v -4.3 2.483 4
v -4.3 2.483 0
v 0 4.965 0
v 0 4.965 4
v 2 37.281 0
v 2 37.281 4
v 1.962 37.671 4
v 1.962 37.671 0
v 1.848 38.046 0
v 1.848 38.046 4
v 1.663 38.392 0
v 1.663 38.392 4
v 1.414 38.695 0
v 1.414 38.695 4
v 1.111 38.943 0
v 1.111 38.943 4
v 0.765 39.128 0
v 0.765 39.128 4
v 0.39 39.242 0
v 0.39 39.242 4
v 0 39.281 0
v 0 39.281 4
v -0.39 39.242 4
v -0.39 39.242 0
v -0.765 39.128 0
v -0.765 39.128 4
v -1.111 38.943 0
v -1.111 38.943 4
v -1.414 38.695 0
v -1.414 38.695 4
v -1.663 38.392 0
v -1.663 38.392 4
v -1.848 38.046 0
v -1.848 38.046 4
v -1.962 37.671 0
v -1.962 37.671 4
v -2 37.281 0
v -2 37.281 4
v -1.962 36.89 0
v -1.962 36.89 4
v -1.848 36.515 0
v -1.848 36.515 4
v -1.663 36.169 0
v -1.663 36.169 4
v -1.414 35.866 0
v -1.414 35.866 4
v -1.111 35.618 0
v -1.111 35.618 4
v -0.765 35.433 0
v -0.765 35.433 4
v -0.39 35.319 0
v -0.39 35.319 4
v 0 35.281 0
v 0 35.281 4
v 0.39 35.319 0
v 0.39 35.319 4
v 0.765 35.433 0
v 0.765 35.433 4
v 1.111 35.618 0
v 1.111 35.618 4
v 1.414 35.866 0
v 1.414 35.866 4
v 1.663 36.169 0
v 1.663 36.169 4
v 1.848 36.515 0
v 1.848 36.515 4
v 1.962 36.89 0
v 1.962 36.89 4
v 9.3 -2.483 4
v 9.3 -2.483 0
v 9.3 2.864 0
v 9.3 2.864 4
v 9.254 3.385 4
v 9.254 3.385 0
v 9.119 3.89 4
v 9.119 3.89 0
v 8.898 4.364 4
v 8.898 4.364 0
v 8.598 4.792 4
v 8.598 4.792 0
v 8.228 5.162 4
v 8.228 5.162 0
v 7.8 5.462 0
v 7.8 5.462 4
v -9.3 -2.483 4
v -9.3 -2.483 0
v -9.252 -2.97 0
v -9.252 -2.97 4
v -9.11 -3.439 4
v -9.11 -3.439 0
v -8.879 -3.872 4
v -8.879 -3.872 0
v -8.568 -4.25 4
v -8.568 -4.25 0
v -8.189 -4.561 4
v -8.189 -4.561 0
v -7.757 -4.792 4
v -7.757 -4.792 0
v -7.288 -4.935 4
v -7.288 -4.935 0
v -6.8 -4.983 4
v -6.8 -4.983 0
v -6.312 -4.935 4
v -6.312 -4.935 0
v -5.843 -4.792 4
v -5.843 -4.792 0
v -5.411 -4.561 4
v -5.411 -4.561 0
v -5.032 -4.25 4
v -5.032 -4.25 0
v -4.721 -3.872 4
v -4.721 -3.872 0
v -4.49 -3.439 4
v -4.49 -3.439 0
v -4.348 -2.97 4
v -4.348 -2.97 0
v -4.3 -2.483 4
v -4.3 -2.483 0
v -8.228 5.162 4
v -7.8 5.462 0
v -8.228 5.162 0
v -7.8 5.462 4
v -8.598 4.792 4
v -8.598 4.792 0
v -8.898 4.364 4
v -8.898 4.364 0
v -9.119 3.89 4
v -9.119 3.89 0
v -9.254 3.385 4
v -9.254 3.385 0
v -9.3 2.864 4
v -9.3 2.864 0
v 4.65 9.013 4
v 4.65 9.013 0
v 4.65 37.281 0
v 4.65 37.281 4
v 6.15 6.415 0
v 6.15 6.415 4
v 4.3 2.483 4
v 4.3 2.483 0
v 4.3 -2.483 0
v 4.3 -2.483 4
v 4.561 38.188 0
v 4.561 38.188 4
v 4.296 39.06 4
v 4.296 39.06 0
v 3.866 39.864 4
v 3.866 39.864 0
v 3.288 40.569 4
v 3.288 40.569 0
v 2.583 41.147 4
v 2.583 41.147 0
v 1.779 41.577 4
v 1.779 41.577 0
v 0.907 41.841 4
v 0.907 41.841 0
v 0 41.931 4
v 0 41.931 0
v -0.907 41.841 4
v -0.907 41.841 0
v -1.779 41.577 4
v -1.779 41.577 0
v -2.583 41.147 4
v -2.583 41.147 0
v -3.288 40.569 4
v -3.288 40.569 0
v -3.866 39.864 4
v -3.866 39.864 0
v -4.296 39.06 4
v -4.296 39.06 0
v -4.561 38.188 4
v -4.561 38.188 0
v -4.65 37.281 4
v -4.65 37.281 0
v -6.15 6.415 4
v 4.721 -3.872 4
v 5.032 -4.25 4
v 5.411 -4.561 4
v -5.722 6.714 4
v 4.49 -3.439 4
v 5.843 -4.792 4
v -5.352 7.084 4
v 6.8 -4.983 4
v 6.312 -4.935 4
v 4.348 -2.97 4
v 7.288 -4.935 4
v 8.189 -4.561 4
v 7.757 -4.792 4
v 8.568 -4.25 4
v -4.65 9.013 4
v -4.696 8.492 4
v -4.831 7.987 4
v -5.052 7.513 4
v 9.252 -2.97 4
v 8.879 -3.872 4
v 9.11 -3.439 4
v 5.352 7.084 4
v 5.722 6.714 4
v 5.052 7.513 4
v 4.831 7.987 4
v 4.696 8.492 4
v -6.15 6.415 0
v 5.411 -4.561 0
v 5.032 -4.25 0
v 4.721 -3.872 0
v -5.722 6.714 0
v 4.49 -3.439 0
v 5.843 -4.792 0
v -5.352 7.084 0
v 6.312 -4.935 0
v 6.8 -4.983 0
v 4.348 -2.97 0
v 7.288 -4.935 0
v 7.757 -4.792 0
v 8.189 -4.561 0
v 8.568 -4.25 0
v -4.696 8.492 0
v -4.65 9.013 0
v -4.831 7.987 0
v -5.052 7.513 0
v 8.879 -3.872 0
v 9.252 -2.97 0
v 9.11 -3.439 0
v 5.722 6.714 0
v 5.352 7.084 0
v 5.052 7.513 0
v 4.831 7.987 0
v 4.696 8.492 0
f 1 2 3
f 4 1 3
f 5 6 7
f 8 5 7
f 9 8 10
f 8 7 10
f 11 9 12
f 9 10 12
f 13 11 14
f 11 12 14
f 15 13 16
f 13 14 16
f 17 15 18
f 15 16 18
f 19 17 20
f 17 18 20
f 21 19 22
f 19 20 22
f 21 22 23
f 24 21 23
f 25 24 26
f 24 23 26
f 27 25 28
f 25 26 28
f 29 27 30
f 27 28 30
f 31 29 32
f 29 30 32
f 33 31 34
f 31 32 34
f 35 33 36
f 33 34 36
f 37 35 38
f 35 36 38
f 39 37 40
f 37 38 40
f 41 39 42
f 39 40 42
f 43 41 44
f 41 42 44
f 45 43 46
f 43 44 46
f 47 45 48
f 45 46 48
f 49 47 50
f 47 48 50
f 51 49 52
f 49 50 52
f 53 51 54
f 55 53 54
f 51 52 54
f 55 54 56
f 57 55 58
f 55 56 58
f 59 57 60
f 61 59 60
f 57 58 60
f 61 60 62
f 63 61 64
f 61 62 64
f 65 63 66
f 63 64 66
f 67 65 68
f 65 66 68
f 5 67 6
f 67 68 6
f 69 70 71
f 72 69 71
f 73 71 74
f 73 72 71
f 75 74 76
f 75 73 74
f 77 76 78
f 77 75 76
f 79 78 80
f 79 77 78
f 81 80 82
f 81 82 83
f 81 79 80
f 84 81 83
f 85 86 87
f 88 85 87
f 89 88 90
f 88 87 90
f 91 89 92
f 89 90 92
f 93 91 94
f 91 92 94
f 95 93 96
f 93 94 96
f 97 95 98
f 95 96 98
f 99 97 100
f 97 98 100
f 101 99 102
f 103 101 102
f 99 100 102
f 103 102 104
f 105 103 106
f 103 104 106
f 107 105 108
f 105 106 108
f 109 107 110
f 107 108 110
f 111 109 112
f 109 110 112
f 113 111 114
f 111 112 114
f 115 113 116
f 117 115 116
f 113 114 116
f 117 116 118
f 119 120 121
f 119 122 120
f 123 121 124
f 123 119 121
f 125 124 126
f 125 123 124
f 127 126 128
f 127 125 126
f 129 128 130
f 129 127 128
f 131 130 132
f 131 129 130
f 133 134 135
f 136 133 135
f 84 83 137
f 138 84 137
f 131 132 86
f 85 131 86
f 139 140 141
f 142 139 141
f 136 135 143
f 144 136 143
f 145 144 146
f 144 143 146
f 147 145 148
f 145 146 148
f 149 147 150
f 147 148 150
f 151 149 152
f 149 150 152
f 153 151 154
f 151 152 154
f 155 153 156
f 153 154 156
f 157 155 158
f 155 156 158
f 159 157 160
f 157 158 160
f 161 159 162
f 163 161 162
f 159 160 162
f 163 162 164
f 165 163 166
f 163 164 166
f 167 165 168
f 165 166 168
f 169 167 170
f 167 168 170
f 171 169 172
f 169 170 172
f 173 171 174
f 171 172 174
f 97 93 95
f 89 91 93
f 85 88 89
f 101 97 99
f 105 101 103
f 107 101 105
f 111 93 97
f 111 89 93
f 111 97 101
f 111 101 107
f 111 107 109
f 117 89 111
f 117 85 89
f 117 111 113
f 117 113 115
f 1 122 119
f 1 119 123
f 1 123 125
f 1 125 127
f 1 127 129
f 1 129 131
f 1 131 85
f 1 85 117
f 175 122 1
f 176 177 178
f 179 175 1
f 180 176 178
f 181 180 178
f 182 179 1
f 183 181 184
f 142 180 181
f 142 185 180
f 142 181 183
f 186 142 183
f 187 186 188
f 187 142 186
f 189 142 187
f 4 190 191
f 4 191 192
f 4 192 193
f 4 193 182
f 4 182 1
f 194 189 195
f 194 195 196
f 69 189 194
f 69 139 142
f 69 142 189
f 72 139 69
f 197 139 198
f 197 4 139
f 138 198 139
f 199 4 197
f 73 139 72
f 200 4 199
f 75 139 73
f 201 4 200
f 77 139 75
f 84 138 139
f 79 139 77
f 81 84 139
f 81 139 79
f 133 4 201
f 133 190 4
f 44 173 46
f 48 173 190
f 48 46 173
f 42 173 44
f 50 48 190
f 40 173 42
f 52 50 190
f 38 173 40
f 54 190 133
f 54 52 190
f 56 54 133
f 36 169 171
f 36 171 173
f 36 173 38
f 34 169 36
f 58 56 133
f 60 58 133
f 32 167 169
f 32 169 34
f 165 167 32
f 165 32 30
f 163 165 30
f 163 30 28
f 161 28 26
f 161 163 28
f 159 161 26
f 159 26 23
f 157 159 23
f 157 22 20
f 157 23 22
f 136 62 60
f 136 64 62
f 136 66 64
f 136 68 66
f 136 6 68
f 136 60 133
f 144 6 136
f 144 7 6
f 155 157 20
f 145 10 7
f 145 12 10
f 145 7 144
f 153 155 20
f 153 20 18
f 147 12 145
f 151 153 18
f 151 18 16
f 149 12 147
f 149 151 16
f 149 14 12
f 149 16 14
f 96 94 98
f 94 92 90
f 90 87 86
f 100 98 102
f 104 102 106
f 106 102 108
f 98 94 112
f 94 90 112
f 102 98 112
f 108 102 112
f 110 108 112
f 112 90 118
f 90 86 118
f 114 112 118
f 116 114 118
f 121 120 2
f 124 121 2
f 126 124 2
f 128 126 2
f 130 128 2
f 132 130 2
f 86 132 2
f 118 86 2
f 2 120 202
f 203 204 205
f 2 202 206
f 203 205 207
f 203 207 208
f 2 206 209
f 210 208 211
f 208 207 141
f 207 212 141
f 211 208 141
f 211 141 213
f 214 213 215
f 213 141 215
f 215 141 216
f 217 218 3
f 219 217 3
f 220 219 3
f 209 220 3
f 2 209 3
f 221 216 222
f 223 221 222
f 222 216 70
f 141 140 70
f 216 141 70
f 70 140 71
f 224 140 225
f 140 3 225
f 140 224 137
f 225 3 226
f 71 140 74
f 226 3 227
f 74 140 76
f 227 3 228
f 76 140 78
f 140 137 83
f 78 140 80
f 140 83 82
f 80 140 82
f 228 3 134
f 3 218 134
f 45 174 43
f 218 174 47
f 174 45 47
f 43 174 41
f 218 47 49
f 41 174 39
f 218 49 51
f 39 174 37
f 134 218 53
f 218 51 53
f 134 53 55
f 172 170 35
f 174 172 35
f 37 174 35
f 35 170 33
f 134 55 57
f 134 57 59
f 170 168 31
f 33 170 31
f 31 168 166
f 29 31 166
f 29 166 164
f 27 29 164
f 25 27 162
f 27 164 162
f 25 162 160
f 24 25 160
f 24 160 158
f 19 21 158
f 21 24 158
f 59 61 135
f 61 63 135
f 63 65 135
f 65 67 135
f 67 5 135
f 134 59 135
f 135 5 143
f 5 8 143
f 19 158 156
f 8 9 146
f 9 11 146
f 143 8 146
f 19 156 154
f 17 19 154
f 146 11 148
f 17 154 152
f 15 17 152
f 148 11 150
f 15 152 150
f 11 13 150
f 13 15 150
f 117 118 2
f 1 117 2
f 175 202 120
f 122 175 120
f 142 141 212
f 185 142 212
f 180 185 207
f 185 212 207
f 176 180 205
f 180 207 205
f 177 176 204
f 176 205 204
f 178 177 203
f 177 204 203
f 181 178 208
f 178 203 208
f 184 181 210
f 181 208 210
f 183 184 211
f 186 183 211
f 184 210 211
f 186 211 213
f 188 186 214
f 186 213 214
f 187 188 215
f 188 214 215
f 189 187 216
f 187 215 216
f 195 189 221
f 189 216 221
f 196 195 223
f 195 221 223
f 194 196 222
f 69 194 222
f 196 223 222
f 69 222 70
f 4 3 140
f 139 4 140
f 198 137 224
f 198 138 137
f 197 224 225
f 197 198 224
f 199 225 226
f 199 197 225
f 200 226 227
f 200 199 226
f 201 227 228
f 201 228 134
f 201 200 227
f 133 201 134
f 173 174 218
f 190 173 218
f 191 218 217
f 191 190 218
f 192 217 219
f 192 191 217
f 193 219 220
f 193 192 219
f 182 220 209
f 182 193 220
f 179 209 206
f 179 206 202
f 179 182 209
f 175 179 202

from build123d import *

# Parameters (mm, degrees)
F1_DEPTH = 4
F2_R     = 3
F3_R     = 2
F4_DEPTH = 4


with BuildPart() as f1:
    # F0 (on Top) → F1 (new body)
    with BuildSketch(Plane.XY):
        Polygon((-4.3, 2.482606), (0, 4.965212), (0, 9.965212), (-4.65, 7.280534), (-9.3, 4.595855), (-9.3, -2.482606), (-4.3, -2.482606), align=None)
        Polygon((0, 4.965212), (4.3, 2.482606), (4.3, -2.482606), (9.3, -2.482606), (9.3, 4.595855), (4.65, 7.280534), (0, 9.965212), align=None)
        with BuildLine():
            Line((-4.65, 7.280534), (0, 9.965212))
            Line((0, 9.965212), (4.65, 7.280534))
            Line((4.65, 7.280534), (4.65, 37.280534))
            ThreePointArc((4.65, 37.280534), (0, 41.930534), (-4.65, 37.280534))
            Line((-4.65, 37.280534), (-4.65, 7.280534))
        make_face()
        with BuildLine():
            ThreePointArc((-9.3, -2.482606), (-6.8, -4.982606), (-4.3, -2.482606))
            Line((-4.3, -2.482606), (-9.3, -2.482606))
        make_face()
        with BuildLine():
            Line((9.3, -2.482606), (4.3, -2.482606))
            ThreePointArc((4.3, -2.482606), (6.8, -4.982606), (9.3, -2.482606))
        make_face()
    extrude(amount=F1_DEPTH)

    # F2
    f2_edges = [f1.edges().sort_by_distance(p)[0] for p in [
        (9.3, 4.595855, 2),
        (4.65, 7.280534, 2),
        (-4.65, 7.280534, 2),
        (-9.3, 4.595855, 2),
    ]]
    fillet(f2_edges, radius=F2_R)

    # F3 (on face) → F4 (cut, through all)
    with BuildSketch(Plane.XY.offset(4)):
        with Locations((0, 37.280534)):
            Circle(F3_R)
    extrude(amount=-F4_DEPTH, mode=Mode.SUBTRACT)


solid = f1.part
